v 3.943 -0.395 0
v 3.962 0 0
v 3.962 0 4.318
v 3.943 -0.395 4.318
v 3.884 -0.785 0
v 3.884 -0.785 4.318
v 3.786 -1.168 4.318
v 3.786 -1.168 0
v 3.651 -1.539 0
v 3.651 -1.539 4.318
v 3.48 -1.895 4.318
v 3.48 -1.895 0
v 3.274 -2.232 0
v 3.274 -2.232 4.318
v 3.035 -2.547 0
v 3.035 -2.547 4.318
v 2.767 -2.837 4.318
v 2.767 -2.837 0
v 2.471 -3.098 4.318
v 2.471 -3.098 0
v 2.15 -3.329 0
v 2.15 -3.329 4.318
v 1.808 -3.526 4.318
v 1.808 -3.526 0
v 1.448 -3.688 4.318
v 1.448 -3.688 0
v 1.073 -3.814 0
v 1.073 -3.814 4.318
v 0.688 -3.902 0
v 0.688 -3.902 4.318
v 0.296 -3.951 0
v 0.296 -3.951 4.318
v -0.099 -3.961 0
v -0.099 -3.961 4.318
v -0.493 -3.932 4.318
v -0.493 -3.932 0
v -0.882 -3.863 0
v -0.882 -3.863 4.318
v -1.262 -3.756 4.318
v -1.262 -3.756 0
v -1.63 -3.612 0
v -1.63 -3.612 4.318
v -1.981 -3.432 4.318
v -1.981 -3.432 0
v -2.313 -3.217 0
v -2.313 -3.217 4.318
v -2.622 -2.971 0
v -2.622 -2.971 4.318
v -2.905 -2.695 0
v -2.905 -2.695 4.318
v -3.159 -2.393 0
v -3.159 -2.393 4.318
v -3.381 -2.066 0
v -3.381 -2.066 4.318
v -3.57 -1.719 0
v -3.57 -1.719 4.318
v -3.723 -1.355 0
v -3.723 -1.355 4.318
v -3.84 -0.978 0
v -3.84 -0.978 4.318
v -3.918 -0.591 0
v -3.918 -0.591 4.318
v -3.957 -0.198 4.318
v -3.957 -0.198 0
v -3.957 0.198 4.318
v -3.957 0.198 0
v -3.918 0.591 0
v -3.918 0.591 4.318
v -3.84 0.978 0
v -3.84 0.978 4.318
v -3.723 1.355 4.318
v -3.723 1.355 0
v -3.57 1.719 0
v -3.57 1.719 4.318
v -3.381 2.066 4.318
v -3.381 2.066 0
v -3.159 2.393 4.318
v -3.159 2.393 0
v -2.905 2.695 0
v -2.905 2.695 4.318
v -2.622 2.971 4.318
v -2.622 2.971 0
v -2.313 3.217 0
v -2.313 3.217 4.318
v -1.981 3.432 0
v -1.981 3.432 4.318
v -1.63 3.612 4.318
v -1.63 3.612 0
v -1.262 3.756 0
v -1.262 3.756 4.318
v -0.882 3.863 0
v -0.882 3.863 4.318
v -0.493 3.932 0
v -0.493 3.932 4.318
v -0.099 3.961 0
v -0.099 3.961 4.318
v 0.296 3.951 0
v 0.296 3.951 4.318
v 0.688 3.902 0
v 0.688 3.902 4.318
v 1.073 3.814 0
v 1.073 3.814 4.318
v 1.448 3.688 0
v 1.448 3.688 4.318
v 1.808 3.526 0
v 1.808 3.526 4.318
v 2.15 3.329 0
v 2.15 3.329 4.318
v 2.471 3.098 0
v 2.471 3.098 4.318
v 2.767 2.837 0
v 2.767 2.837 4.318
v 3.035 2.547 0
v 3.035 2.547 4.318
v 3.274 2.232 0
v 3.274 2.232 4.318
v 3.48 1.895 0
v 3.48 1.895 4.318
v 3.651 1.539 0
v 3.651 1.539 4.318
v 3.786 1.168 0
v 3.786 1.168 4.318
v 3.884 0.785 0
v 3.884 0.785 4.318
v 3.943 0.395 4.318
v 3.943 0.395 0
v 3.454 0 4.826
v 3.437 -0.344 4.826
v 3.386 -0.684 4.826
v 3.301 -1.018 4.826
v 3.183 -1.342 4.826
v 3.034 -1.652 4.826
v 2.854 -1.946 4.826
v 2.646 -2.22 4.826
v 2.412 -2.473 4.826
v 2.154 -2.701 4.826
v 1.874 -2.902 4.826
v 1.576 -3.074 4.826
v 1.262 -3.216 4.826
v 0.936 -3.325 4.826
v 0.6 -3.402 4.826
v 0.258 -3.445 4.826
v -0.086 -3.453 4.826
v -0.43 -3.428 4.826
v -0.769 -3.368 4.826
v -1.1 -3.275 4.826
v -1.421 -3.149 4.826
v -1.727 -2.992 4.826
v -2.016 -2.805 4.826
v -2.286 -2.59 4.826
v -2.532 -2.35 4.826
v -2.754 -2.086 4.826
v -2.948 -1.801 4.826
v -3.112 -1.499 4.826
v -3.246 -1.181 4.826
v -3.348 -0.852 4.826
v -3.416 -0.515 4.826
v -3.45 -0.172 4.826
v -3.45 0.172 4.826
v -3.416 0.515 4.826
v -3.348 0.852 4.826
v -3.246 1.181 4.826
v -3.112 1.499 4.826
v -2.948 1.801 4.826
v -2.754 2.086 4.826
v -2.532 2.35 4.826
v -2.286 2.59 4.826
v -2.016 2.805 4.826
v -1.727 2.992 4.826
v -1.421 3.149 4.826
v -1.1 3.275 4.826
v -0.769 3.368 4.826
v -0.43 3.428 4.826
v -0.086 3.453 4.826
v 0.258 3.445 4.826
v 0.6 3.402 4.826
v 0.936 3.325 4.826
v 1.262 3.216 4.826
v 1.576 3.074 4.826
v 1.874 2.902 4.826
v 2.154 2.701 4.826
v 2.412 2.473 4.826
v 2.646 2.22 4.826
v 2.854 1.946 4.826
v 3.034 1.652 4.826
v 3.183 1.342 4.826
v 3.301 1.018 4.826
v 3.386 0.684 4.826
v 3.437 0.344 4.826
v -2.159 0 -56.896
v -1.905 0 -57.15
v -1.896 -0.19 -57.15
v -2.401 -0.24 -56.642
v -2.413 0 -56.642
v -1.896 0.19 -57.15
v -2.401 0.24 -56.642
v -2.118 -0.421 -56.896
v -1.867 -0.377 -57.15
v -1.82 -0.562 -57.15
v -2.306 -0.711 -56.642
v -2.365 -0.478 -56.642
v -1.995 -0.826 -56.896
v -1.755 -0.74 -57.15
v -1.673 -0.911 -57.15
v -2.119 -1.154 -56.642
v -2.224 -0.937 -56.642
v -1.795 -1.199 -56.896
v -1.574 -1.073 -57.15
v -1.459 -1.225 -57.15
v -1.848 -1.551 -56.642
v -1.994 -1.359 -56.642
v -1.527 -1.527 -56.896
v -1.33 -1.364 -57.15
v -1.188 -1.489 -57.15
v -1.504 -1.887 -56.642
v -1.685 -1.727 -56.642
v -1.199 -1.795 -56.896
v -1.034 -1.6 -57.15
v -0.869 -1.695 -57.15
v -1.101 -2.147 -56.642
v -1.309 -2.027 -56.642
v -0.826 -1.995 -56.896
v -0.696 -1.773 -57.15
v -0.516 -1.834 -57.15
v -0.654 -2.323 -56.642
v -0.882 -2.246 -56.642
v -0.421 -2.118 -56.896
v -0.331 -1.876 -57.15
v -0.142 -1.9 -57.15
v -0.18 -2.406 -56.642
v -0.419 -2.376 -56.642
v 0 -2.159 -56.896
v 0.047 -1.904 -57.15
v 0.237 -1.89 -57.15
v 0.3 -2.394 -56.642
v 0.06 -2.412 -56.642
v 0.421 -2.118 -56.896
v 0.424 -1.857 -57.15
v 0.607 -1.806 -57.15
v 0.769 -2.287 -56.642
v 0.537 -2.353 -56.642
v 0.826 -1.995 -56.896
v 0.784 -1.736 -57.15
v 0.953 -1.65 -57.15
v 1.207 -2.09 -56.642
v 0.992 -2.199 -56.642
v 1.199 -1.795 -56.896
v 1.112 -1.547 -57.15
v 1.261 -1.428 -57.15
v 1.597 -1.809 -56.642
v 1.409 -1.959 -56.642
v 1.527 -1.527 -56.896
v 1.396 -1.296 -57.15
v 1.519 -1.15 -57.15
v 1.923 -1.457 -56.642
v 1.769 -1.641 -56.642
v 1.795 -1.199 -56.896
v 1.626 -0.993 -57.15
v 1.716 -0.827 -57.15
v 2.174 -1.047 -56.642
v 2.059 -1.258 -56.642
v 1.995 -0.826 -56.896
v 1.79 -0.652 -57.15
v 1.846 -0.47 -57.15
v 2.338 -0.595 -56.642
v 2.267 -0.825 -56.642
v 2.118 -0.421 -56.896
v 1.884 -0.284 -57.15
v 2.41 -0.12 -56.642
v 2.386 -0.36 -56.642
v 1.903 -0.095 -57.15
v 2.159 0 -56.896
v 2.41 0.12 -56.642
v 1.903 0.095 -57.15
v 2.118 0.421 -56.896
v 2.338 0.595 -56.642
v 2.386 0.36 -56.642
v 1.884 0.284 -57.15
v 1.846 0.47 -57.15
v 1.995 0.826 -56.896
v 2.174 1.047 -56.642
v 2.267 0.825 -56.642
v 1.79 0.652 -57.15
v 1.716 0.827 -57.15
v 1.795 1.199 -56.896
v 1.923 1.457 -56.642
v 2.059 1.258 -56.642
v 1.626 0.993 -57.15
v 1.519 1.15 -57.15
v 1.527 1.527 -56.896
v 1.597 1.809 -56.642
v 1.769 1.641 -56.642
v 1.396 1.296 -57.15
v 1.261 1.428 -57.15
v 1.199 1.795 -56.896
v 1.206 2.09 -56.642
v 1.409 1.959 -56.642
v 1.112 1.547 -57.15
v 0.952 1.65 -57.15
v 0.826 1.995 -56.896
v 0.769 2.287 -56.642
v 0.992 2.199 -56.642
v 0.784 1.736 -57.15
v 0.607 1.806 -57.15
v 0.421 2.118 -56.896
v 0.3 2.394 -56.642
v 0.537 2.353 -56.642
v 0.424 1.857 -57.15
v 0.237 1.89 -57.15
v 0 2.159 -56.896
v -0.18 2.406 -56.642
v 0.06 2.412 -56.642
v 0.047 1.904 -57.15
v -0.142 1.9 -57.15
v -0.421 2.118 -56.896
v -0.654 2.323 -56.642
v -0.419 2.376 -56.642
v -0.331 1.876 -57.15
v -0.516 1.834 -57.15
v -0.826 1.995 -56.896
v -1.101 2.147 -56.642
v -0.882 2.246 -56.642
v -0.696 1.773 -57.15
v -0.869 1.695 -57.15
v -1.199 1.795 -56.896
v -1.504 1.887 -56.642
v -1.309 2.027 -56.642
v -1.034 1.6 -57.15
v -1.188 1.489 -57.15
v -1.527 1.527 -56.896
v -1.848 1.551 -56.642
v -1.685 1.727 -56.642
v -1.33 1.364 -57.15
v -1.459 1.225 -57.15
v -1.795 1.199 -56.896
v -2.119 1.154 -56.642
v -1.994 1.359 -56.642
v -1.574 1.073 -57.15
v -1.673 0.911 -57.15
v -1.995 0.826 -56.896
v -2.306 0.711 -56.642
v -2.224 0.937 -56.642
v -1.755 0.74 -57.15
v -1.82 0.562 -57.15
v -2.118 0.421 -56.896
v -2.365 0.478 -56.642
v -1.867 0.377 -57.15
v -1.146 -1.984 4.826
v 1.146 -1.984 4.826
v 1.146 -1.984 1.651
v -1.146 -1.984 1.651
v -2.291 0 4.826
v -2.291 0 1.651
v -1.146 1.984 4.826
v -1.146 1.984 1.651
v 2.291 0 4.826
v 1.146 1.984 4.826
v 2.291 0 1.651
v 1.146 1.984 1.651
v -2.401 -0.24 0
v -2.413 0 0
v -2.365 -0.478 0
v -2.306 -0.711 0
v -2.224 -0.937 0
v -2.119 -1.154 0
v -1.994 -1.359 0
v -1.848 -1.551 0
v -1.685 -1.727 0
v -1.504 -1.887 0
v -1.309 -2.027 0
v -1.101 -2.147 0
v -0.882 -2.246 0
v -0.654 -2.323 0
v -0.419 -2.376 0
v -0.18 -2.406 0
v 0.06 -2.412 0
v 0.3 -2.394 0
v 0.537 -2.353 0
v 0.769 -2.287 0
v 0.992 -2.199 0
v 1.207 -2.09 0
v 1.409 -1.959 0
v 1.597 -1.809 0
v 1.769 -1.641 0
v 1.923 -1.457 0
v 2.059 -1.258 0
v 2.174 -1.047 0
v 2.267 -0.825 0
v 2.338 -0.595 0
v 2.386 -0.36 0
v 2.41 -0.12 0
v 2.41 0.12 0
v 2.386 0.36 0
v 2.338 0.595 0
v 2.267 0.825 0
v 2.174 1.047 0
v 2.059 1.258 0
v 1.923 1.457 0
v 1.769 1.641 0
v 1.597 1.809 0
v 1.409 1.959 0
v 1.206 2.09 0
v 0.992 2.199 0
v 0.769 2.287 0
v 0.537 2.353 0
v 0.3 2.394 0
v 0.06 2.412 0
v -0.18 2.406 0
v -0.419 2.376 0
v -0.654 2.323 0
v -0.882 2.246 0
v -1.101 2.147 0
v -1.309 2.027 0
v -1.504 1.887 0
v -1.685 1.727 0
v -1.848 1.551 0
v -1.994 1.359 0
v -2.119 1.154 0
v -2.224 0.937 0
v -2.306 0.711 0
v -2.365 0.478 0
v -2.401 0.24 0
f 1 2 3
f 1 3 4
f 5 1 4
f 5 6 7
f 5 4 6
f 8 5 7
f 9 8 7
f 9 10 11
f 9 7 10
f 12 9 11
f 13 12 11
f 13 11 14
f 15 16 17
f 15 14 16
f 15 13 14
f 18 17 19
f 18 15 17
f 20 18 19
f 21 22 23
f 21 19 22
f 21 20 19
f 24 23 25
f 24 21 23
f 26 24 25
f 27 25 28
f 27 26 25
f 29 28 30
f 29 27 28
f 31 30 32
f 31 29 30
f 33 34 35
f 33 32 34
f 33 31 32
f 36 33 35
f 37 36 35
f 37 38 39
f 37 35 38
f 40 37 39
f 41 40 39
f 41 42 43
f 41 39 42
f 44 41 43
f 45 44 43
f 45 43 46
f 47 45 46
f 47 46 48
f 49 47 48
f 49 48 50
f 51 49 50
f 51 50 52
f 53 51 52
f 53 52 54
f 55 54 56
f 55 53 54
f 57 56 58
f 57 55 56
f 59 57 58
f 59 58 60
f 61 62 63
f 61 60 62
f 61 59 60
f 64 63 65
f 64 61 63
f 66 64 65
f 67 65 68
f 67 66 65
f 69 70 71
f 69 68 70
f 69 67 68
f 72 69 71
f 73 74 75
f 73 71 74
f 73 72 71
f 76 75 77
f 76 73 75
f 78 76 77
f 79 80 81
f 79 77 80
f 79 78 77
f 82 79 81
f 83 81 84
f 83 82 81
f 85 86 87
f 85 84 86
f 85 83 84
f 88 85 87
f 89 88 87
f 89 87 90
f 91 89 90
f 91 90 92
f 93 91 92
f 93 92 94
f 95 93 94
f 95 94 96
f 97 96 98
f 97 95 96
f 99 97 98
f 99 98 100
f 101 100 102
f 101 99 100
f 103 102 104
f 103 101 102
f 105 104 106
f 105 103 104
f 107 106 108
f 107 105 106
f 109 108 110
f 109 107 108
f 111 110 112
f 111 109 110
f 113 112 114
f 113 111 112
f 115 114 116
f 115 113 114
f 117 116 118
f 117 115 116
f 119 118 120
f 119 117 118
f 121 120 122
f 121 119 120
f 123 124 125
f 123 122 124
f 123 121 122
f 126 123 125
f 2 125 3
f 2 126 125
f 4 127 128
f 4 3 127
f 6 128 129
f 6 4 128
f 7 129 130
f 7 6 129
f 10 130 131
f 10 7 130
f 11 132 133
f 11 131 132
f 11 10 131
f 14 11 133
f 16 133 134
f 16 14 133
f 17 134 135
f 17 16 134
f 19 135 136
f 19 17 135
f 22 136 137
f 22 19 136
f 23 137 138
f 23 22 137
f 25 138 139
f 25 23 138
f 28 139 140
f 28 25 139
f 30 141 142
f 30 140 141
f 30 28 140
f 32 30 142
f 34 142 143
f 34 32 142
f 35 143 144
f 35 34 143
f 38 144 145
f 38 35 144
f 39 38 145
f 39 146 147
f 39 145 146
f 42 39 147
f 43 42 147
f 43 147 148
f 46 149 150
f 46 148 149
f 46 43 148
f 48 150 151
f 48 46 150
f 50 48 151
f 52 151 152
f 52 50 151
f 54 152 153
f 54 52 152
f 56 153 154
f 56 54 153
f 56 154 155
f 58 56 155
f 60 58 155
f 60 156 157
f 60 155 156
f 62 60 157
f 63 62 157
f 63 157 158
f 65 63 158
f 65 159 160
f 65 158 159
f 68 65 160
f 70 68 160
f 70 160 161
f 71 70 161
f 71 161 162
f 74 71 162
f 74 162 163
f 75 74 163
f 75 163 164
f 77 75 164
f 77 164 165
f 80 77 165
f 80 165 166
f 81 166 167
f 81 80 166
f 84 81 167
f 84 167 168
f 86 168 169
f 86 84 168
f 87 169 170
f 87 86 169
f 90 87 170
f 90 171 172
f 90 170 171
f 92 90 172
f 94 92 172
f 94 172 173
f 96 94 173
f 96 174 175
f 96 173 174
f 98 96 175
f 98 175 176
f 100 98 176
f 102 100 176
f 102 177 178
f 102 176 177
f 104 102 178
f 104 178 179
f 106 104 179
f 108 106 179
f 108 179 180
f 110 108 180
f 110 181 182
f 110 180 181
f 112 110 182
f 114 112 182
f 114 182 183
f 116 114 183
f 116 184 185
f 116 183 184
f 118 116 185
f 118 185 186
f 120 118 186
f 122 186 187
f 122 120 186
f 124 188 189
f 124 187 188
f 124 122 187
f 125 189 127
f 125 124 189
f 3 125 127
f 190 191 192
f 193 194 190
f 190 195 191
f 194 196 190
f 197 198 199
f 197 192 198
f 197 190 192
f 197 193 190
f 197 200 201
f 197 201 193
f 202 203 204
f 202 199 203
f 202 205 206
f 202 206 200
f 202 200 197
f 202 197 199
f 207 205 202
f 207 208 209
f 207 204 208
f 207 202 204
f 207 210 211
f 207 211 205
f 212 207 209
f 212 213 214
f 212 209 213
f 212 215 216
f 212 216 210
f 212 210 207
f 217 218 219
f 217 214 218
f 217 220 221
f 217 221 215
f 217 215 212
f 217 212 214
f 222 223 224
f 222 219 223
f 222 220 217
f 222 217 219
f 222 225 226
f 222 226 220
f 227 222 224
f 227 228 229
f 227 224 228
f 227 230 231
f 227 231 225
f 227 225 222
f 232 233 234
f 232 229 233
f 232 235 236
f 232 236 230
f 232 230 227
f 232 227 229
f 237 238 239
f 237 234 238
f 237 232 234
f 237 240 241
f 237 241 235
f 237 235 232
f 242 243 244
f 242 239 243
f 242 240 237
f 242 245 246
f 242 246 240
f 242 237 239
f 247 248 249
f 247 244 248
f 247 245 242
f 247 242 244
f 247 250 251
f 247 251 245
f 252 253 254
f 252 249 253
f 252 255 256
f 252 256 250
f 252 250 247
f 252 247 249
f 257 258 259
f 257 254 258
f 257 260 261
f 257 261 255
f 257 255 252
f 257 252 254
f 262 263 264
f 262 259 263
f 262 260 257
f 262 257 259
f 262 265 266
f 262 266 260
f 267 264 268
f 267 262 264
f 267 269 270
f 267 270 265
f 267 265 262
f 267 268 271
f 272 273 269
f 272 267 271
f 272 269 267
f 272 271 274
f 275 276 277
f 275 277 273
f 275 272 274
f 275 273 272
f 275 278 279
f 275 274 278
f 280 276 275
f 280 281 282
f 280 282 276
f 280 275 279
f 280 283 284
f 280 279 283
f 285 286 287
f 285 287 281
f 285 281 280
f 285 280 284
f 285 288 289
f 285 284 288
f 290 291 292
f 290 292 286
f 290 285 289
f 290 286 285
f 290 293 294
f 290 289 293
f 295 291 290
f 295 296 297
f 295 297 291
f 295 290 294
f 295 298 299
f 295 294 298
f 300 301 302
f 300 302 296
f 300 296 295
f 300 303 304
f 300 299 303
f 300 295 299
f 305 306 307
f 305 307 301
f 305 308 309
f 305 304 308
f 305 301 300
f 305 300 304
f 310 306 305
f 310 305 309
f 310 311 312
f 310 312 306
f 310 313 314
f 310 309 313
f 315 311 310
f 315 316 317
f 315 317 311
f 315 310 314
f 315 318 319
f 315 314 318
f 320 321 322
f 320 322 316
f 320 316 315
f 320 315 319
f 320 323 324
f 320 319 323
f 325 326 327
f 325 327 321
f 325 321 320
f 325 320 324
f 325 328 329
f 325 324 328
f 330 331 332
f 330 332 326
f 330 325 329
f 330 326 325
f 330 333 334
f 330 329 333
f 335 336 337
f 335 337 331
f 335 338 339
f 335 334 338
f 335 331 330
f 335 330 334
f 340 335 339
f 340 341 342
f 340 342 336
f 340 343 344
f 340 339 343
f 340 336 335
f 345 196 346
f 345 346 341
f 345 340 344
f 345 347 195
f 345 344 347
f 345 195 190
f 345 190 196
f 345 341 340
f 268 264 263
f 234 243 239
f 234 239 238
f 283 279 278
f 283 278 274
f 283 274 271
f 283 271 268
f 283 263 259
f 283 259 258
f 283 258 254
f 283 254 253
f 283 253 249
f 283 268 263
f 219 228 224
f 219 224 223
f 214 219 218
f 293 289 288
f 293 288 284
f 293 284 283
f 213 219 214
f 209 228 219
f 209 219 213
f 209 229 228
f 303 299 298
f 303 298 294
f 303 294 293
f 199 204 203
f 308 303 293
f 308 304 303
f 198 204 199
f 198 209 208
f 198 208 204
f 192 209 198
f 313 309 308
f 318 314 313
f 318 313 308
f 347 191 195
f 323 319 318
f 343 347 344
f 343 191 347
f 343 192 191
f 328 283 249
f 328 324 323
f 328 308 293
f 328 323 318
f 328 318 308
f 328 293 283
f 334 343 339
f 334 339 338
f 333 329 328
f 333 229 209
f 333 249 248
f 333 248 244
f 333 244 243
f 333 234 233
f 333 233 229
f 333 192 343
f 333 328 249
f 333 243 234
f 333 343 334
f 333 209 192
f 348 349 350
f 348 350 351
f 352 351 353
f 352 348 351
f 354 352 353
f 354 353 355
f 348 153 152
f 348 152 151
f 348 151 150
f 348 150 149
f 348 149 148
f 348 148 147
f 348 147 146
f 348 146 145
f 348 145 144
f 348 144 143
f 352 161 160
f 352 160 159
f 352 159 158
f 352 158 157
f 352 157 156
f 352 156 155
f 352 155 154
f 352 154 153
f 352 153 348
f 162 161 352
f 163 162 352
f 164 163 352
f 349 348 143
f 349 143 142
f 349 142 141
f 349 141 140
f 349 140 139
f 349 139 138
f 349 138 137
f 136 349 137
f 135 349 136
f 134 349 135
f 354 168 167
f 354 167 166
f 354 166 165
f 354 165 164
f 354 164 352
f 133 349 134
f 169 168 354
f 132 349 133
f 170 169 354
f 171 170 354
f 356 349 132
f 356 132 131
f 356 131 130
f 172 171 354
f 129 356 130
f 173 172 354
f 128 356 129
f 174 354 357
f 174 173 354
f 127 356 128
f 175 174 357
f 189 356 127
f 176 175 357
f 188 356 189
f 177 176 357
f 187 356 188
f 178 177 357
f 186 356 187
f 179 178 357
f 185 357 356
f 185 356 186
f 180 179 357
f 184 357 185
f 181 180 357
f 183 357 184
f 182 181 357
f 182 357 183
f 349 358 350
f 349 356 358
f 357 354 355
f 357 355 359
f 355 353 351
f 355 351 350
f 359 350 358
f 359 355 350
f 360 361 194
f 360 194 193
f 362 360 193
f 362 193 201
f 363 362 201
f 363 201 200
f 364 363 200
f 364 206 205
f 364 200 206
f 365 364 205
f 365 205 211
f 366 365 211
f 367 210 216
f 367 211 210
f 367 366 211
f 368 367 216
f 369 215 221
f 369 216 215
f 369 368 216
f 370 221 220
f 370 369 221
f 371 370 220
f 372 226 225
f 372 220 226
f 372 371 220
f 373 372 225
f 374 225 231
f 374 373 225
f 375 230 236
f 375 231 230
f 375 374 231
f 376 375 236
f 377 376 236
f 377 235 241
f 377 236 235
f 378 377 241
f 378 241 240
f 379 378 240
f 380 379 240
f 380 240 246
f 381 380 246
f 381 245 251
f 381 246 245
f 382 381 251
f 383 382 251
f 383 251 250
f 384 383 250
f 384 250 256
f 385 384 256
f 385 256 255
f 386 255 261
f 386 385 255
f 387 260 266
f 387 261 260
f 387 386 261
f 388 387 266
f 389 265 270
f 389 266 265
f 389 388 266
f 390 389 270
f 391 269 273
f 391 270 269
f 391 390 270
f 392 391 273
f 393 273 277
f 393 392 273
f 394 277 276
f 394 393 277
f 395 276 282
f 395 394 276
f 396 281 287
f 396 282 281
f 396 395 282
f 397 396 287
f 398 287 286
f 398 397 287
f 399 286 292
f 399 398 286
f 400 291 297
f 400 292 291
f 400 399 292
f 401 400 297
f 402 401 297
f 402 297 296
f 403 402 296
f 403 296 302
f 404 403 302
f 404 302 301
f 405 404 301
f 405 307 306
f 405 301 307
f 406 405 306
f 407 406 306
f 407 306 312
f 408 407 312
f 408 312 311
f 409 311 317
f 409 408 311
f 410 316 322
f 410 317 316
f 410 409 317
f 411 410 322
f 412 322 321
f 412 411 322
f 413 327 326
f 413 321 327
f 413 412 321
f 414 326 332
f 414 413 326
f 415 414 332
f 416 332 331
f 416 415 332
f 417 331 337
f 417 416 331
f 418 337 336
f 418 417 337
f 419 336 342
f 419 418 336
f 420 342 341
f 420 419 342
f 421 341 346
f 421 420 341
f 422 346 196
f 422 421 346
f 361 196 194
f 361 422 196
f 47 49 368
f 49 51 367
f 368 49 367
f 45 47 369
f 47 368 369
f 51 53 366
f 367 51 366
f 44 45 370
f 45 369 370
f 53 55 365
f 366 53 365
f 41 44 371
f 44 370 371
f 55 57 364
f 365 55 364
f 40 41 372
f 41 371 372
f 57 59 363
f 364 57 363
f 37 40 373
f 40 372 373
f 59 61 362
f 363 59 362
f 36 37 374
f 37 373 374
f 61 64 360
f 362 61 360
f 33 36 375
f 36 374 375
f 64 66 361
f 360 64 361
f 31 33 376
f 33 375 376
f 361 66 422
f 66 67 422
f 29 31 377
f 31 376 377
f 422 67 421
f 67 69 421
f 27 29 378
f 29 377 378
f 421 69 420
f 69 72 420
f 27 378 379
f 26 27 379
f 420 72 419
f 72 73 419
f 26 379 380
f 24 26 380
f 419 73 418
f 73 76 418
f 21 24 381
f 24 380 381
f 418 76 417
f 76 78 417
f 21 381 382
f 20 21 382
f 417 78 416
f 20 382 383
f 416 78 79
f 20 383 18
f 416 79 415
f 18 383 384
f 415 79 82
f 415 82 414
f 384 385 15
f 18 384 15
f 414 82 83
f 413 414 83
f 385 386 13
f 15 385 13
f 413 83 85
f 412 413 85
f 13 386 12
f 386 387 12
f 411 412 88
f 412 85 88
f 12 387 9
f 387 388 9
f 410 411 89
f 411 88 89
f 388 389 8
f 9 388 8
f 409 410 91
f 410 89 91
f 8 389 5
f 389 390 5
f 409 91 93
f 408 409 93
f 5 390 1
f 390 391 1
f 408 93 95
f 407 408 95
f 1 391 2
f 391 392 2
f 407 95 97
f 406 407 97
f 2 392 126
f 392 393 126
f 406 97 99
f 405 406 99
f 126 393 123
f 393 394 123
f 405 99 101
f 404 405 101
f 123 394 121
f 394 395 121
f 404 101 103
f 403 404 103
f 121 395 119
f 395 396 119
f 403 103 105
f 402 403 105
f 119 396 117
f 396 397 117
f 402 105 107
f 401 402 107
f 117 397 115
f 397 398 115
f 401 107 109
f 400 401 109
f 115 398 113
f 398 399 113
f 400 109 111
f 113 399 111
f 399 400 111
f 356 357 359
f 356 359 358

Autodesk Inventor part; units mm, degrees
ref_plane "YZ Plane" through (0, 0, 0) normal (1, 0, 0) x (0, 1, 0)
ref_plane "XZ Plane" through (0, 0, 0) normal (0, 1, 0) x (-1, 0, 0)
ref_plane "XY Plane" through (0, 0, 0) normal (0, 0, 1) x (1, 0, 0)
sketch "Sketch1" plane through (0, 0, 0) normal (0, 0, 1) x (1, 0, 0)
  circle A0 centre (0, 0) radius 3.9624
  dimension "d0" = 7.9248
extrude "Extrusion1" add sketch "Sketch1" along normal blind 4.826
sketch "Sketch2" plane through (0, 0, 0) normal (0, 0, -1) x (-1, 0, 0)
  circle A0 centre (0, 0) radius 3.9624 projected
  circle A1 centre (0, 0) radius 2.413
  dimension "d3" = 4.826
extrude "Extrusion2" add sketch "Sketch2" along normal blind 57.15 contours A1
sketch "Sketch3" plane through (0, 0, 4.826) normal (0, 0, 1) x (1, 0, 0)
  circle A0 centre (0, 0) radius 3.9624 projected
  line L0 (-1.1457, 1.9844) -> (1.1457, 1.9844)
  line L1 (1.1457, 1.9844) -> (2.2914, 0)
  line L2 (2.2914, 0) -> (1.1457, -1.9844)
  line L3 (1.1457, -1.9844) -> (-1.1457, -1.9844)
  line L4 (-1.1457, -1.9844) -> (-2.2914, 0)
  line L5 (-2.2914, 0) -> (-1.1457, 1.9844)
  dimension "d6" = 3.9688
extrude "Extrusion3" cut sketch "Sketch3" against normal blind 3.175 contours L0 L1 L2 L3 L4 L5
thread "Thread1" size "10-32 UNF" class "2A" standard "ANSI Unified Screw Threads" length 25.4
chamfer "Chamfer1" distance 0.508 angle 45 1 edges at (2.413, 0, -57.15)
chamfer "Chamfer2" distance 0.508 angle 45 1 edges at (-3.9624, 0, 4.826)
properties part number "10-32 x1000" material "Steel"
